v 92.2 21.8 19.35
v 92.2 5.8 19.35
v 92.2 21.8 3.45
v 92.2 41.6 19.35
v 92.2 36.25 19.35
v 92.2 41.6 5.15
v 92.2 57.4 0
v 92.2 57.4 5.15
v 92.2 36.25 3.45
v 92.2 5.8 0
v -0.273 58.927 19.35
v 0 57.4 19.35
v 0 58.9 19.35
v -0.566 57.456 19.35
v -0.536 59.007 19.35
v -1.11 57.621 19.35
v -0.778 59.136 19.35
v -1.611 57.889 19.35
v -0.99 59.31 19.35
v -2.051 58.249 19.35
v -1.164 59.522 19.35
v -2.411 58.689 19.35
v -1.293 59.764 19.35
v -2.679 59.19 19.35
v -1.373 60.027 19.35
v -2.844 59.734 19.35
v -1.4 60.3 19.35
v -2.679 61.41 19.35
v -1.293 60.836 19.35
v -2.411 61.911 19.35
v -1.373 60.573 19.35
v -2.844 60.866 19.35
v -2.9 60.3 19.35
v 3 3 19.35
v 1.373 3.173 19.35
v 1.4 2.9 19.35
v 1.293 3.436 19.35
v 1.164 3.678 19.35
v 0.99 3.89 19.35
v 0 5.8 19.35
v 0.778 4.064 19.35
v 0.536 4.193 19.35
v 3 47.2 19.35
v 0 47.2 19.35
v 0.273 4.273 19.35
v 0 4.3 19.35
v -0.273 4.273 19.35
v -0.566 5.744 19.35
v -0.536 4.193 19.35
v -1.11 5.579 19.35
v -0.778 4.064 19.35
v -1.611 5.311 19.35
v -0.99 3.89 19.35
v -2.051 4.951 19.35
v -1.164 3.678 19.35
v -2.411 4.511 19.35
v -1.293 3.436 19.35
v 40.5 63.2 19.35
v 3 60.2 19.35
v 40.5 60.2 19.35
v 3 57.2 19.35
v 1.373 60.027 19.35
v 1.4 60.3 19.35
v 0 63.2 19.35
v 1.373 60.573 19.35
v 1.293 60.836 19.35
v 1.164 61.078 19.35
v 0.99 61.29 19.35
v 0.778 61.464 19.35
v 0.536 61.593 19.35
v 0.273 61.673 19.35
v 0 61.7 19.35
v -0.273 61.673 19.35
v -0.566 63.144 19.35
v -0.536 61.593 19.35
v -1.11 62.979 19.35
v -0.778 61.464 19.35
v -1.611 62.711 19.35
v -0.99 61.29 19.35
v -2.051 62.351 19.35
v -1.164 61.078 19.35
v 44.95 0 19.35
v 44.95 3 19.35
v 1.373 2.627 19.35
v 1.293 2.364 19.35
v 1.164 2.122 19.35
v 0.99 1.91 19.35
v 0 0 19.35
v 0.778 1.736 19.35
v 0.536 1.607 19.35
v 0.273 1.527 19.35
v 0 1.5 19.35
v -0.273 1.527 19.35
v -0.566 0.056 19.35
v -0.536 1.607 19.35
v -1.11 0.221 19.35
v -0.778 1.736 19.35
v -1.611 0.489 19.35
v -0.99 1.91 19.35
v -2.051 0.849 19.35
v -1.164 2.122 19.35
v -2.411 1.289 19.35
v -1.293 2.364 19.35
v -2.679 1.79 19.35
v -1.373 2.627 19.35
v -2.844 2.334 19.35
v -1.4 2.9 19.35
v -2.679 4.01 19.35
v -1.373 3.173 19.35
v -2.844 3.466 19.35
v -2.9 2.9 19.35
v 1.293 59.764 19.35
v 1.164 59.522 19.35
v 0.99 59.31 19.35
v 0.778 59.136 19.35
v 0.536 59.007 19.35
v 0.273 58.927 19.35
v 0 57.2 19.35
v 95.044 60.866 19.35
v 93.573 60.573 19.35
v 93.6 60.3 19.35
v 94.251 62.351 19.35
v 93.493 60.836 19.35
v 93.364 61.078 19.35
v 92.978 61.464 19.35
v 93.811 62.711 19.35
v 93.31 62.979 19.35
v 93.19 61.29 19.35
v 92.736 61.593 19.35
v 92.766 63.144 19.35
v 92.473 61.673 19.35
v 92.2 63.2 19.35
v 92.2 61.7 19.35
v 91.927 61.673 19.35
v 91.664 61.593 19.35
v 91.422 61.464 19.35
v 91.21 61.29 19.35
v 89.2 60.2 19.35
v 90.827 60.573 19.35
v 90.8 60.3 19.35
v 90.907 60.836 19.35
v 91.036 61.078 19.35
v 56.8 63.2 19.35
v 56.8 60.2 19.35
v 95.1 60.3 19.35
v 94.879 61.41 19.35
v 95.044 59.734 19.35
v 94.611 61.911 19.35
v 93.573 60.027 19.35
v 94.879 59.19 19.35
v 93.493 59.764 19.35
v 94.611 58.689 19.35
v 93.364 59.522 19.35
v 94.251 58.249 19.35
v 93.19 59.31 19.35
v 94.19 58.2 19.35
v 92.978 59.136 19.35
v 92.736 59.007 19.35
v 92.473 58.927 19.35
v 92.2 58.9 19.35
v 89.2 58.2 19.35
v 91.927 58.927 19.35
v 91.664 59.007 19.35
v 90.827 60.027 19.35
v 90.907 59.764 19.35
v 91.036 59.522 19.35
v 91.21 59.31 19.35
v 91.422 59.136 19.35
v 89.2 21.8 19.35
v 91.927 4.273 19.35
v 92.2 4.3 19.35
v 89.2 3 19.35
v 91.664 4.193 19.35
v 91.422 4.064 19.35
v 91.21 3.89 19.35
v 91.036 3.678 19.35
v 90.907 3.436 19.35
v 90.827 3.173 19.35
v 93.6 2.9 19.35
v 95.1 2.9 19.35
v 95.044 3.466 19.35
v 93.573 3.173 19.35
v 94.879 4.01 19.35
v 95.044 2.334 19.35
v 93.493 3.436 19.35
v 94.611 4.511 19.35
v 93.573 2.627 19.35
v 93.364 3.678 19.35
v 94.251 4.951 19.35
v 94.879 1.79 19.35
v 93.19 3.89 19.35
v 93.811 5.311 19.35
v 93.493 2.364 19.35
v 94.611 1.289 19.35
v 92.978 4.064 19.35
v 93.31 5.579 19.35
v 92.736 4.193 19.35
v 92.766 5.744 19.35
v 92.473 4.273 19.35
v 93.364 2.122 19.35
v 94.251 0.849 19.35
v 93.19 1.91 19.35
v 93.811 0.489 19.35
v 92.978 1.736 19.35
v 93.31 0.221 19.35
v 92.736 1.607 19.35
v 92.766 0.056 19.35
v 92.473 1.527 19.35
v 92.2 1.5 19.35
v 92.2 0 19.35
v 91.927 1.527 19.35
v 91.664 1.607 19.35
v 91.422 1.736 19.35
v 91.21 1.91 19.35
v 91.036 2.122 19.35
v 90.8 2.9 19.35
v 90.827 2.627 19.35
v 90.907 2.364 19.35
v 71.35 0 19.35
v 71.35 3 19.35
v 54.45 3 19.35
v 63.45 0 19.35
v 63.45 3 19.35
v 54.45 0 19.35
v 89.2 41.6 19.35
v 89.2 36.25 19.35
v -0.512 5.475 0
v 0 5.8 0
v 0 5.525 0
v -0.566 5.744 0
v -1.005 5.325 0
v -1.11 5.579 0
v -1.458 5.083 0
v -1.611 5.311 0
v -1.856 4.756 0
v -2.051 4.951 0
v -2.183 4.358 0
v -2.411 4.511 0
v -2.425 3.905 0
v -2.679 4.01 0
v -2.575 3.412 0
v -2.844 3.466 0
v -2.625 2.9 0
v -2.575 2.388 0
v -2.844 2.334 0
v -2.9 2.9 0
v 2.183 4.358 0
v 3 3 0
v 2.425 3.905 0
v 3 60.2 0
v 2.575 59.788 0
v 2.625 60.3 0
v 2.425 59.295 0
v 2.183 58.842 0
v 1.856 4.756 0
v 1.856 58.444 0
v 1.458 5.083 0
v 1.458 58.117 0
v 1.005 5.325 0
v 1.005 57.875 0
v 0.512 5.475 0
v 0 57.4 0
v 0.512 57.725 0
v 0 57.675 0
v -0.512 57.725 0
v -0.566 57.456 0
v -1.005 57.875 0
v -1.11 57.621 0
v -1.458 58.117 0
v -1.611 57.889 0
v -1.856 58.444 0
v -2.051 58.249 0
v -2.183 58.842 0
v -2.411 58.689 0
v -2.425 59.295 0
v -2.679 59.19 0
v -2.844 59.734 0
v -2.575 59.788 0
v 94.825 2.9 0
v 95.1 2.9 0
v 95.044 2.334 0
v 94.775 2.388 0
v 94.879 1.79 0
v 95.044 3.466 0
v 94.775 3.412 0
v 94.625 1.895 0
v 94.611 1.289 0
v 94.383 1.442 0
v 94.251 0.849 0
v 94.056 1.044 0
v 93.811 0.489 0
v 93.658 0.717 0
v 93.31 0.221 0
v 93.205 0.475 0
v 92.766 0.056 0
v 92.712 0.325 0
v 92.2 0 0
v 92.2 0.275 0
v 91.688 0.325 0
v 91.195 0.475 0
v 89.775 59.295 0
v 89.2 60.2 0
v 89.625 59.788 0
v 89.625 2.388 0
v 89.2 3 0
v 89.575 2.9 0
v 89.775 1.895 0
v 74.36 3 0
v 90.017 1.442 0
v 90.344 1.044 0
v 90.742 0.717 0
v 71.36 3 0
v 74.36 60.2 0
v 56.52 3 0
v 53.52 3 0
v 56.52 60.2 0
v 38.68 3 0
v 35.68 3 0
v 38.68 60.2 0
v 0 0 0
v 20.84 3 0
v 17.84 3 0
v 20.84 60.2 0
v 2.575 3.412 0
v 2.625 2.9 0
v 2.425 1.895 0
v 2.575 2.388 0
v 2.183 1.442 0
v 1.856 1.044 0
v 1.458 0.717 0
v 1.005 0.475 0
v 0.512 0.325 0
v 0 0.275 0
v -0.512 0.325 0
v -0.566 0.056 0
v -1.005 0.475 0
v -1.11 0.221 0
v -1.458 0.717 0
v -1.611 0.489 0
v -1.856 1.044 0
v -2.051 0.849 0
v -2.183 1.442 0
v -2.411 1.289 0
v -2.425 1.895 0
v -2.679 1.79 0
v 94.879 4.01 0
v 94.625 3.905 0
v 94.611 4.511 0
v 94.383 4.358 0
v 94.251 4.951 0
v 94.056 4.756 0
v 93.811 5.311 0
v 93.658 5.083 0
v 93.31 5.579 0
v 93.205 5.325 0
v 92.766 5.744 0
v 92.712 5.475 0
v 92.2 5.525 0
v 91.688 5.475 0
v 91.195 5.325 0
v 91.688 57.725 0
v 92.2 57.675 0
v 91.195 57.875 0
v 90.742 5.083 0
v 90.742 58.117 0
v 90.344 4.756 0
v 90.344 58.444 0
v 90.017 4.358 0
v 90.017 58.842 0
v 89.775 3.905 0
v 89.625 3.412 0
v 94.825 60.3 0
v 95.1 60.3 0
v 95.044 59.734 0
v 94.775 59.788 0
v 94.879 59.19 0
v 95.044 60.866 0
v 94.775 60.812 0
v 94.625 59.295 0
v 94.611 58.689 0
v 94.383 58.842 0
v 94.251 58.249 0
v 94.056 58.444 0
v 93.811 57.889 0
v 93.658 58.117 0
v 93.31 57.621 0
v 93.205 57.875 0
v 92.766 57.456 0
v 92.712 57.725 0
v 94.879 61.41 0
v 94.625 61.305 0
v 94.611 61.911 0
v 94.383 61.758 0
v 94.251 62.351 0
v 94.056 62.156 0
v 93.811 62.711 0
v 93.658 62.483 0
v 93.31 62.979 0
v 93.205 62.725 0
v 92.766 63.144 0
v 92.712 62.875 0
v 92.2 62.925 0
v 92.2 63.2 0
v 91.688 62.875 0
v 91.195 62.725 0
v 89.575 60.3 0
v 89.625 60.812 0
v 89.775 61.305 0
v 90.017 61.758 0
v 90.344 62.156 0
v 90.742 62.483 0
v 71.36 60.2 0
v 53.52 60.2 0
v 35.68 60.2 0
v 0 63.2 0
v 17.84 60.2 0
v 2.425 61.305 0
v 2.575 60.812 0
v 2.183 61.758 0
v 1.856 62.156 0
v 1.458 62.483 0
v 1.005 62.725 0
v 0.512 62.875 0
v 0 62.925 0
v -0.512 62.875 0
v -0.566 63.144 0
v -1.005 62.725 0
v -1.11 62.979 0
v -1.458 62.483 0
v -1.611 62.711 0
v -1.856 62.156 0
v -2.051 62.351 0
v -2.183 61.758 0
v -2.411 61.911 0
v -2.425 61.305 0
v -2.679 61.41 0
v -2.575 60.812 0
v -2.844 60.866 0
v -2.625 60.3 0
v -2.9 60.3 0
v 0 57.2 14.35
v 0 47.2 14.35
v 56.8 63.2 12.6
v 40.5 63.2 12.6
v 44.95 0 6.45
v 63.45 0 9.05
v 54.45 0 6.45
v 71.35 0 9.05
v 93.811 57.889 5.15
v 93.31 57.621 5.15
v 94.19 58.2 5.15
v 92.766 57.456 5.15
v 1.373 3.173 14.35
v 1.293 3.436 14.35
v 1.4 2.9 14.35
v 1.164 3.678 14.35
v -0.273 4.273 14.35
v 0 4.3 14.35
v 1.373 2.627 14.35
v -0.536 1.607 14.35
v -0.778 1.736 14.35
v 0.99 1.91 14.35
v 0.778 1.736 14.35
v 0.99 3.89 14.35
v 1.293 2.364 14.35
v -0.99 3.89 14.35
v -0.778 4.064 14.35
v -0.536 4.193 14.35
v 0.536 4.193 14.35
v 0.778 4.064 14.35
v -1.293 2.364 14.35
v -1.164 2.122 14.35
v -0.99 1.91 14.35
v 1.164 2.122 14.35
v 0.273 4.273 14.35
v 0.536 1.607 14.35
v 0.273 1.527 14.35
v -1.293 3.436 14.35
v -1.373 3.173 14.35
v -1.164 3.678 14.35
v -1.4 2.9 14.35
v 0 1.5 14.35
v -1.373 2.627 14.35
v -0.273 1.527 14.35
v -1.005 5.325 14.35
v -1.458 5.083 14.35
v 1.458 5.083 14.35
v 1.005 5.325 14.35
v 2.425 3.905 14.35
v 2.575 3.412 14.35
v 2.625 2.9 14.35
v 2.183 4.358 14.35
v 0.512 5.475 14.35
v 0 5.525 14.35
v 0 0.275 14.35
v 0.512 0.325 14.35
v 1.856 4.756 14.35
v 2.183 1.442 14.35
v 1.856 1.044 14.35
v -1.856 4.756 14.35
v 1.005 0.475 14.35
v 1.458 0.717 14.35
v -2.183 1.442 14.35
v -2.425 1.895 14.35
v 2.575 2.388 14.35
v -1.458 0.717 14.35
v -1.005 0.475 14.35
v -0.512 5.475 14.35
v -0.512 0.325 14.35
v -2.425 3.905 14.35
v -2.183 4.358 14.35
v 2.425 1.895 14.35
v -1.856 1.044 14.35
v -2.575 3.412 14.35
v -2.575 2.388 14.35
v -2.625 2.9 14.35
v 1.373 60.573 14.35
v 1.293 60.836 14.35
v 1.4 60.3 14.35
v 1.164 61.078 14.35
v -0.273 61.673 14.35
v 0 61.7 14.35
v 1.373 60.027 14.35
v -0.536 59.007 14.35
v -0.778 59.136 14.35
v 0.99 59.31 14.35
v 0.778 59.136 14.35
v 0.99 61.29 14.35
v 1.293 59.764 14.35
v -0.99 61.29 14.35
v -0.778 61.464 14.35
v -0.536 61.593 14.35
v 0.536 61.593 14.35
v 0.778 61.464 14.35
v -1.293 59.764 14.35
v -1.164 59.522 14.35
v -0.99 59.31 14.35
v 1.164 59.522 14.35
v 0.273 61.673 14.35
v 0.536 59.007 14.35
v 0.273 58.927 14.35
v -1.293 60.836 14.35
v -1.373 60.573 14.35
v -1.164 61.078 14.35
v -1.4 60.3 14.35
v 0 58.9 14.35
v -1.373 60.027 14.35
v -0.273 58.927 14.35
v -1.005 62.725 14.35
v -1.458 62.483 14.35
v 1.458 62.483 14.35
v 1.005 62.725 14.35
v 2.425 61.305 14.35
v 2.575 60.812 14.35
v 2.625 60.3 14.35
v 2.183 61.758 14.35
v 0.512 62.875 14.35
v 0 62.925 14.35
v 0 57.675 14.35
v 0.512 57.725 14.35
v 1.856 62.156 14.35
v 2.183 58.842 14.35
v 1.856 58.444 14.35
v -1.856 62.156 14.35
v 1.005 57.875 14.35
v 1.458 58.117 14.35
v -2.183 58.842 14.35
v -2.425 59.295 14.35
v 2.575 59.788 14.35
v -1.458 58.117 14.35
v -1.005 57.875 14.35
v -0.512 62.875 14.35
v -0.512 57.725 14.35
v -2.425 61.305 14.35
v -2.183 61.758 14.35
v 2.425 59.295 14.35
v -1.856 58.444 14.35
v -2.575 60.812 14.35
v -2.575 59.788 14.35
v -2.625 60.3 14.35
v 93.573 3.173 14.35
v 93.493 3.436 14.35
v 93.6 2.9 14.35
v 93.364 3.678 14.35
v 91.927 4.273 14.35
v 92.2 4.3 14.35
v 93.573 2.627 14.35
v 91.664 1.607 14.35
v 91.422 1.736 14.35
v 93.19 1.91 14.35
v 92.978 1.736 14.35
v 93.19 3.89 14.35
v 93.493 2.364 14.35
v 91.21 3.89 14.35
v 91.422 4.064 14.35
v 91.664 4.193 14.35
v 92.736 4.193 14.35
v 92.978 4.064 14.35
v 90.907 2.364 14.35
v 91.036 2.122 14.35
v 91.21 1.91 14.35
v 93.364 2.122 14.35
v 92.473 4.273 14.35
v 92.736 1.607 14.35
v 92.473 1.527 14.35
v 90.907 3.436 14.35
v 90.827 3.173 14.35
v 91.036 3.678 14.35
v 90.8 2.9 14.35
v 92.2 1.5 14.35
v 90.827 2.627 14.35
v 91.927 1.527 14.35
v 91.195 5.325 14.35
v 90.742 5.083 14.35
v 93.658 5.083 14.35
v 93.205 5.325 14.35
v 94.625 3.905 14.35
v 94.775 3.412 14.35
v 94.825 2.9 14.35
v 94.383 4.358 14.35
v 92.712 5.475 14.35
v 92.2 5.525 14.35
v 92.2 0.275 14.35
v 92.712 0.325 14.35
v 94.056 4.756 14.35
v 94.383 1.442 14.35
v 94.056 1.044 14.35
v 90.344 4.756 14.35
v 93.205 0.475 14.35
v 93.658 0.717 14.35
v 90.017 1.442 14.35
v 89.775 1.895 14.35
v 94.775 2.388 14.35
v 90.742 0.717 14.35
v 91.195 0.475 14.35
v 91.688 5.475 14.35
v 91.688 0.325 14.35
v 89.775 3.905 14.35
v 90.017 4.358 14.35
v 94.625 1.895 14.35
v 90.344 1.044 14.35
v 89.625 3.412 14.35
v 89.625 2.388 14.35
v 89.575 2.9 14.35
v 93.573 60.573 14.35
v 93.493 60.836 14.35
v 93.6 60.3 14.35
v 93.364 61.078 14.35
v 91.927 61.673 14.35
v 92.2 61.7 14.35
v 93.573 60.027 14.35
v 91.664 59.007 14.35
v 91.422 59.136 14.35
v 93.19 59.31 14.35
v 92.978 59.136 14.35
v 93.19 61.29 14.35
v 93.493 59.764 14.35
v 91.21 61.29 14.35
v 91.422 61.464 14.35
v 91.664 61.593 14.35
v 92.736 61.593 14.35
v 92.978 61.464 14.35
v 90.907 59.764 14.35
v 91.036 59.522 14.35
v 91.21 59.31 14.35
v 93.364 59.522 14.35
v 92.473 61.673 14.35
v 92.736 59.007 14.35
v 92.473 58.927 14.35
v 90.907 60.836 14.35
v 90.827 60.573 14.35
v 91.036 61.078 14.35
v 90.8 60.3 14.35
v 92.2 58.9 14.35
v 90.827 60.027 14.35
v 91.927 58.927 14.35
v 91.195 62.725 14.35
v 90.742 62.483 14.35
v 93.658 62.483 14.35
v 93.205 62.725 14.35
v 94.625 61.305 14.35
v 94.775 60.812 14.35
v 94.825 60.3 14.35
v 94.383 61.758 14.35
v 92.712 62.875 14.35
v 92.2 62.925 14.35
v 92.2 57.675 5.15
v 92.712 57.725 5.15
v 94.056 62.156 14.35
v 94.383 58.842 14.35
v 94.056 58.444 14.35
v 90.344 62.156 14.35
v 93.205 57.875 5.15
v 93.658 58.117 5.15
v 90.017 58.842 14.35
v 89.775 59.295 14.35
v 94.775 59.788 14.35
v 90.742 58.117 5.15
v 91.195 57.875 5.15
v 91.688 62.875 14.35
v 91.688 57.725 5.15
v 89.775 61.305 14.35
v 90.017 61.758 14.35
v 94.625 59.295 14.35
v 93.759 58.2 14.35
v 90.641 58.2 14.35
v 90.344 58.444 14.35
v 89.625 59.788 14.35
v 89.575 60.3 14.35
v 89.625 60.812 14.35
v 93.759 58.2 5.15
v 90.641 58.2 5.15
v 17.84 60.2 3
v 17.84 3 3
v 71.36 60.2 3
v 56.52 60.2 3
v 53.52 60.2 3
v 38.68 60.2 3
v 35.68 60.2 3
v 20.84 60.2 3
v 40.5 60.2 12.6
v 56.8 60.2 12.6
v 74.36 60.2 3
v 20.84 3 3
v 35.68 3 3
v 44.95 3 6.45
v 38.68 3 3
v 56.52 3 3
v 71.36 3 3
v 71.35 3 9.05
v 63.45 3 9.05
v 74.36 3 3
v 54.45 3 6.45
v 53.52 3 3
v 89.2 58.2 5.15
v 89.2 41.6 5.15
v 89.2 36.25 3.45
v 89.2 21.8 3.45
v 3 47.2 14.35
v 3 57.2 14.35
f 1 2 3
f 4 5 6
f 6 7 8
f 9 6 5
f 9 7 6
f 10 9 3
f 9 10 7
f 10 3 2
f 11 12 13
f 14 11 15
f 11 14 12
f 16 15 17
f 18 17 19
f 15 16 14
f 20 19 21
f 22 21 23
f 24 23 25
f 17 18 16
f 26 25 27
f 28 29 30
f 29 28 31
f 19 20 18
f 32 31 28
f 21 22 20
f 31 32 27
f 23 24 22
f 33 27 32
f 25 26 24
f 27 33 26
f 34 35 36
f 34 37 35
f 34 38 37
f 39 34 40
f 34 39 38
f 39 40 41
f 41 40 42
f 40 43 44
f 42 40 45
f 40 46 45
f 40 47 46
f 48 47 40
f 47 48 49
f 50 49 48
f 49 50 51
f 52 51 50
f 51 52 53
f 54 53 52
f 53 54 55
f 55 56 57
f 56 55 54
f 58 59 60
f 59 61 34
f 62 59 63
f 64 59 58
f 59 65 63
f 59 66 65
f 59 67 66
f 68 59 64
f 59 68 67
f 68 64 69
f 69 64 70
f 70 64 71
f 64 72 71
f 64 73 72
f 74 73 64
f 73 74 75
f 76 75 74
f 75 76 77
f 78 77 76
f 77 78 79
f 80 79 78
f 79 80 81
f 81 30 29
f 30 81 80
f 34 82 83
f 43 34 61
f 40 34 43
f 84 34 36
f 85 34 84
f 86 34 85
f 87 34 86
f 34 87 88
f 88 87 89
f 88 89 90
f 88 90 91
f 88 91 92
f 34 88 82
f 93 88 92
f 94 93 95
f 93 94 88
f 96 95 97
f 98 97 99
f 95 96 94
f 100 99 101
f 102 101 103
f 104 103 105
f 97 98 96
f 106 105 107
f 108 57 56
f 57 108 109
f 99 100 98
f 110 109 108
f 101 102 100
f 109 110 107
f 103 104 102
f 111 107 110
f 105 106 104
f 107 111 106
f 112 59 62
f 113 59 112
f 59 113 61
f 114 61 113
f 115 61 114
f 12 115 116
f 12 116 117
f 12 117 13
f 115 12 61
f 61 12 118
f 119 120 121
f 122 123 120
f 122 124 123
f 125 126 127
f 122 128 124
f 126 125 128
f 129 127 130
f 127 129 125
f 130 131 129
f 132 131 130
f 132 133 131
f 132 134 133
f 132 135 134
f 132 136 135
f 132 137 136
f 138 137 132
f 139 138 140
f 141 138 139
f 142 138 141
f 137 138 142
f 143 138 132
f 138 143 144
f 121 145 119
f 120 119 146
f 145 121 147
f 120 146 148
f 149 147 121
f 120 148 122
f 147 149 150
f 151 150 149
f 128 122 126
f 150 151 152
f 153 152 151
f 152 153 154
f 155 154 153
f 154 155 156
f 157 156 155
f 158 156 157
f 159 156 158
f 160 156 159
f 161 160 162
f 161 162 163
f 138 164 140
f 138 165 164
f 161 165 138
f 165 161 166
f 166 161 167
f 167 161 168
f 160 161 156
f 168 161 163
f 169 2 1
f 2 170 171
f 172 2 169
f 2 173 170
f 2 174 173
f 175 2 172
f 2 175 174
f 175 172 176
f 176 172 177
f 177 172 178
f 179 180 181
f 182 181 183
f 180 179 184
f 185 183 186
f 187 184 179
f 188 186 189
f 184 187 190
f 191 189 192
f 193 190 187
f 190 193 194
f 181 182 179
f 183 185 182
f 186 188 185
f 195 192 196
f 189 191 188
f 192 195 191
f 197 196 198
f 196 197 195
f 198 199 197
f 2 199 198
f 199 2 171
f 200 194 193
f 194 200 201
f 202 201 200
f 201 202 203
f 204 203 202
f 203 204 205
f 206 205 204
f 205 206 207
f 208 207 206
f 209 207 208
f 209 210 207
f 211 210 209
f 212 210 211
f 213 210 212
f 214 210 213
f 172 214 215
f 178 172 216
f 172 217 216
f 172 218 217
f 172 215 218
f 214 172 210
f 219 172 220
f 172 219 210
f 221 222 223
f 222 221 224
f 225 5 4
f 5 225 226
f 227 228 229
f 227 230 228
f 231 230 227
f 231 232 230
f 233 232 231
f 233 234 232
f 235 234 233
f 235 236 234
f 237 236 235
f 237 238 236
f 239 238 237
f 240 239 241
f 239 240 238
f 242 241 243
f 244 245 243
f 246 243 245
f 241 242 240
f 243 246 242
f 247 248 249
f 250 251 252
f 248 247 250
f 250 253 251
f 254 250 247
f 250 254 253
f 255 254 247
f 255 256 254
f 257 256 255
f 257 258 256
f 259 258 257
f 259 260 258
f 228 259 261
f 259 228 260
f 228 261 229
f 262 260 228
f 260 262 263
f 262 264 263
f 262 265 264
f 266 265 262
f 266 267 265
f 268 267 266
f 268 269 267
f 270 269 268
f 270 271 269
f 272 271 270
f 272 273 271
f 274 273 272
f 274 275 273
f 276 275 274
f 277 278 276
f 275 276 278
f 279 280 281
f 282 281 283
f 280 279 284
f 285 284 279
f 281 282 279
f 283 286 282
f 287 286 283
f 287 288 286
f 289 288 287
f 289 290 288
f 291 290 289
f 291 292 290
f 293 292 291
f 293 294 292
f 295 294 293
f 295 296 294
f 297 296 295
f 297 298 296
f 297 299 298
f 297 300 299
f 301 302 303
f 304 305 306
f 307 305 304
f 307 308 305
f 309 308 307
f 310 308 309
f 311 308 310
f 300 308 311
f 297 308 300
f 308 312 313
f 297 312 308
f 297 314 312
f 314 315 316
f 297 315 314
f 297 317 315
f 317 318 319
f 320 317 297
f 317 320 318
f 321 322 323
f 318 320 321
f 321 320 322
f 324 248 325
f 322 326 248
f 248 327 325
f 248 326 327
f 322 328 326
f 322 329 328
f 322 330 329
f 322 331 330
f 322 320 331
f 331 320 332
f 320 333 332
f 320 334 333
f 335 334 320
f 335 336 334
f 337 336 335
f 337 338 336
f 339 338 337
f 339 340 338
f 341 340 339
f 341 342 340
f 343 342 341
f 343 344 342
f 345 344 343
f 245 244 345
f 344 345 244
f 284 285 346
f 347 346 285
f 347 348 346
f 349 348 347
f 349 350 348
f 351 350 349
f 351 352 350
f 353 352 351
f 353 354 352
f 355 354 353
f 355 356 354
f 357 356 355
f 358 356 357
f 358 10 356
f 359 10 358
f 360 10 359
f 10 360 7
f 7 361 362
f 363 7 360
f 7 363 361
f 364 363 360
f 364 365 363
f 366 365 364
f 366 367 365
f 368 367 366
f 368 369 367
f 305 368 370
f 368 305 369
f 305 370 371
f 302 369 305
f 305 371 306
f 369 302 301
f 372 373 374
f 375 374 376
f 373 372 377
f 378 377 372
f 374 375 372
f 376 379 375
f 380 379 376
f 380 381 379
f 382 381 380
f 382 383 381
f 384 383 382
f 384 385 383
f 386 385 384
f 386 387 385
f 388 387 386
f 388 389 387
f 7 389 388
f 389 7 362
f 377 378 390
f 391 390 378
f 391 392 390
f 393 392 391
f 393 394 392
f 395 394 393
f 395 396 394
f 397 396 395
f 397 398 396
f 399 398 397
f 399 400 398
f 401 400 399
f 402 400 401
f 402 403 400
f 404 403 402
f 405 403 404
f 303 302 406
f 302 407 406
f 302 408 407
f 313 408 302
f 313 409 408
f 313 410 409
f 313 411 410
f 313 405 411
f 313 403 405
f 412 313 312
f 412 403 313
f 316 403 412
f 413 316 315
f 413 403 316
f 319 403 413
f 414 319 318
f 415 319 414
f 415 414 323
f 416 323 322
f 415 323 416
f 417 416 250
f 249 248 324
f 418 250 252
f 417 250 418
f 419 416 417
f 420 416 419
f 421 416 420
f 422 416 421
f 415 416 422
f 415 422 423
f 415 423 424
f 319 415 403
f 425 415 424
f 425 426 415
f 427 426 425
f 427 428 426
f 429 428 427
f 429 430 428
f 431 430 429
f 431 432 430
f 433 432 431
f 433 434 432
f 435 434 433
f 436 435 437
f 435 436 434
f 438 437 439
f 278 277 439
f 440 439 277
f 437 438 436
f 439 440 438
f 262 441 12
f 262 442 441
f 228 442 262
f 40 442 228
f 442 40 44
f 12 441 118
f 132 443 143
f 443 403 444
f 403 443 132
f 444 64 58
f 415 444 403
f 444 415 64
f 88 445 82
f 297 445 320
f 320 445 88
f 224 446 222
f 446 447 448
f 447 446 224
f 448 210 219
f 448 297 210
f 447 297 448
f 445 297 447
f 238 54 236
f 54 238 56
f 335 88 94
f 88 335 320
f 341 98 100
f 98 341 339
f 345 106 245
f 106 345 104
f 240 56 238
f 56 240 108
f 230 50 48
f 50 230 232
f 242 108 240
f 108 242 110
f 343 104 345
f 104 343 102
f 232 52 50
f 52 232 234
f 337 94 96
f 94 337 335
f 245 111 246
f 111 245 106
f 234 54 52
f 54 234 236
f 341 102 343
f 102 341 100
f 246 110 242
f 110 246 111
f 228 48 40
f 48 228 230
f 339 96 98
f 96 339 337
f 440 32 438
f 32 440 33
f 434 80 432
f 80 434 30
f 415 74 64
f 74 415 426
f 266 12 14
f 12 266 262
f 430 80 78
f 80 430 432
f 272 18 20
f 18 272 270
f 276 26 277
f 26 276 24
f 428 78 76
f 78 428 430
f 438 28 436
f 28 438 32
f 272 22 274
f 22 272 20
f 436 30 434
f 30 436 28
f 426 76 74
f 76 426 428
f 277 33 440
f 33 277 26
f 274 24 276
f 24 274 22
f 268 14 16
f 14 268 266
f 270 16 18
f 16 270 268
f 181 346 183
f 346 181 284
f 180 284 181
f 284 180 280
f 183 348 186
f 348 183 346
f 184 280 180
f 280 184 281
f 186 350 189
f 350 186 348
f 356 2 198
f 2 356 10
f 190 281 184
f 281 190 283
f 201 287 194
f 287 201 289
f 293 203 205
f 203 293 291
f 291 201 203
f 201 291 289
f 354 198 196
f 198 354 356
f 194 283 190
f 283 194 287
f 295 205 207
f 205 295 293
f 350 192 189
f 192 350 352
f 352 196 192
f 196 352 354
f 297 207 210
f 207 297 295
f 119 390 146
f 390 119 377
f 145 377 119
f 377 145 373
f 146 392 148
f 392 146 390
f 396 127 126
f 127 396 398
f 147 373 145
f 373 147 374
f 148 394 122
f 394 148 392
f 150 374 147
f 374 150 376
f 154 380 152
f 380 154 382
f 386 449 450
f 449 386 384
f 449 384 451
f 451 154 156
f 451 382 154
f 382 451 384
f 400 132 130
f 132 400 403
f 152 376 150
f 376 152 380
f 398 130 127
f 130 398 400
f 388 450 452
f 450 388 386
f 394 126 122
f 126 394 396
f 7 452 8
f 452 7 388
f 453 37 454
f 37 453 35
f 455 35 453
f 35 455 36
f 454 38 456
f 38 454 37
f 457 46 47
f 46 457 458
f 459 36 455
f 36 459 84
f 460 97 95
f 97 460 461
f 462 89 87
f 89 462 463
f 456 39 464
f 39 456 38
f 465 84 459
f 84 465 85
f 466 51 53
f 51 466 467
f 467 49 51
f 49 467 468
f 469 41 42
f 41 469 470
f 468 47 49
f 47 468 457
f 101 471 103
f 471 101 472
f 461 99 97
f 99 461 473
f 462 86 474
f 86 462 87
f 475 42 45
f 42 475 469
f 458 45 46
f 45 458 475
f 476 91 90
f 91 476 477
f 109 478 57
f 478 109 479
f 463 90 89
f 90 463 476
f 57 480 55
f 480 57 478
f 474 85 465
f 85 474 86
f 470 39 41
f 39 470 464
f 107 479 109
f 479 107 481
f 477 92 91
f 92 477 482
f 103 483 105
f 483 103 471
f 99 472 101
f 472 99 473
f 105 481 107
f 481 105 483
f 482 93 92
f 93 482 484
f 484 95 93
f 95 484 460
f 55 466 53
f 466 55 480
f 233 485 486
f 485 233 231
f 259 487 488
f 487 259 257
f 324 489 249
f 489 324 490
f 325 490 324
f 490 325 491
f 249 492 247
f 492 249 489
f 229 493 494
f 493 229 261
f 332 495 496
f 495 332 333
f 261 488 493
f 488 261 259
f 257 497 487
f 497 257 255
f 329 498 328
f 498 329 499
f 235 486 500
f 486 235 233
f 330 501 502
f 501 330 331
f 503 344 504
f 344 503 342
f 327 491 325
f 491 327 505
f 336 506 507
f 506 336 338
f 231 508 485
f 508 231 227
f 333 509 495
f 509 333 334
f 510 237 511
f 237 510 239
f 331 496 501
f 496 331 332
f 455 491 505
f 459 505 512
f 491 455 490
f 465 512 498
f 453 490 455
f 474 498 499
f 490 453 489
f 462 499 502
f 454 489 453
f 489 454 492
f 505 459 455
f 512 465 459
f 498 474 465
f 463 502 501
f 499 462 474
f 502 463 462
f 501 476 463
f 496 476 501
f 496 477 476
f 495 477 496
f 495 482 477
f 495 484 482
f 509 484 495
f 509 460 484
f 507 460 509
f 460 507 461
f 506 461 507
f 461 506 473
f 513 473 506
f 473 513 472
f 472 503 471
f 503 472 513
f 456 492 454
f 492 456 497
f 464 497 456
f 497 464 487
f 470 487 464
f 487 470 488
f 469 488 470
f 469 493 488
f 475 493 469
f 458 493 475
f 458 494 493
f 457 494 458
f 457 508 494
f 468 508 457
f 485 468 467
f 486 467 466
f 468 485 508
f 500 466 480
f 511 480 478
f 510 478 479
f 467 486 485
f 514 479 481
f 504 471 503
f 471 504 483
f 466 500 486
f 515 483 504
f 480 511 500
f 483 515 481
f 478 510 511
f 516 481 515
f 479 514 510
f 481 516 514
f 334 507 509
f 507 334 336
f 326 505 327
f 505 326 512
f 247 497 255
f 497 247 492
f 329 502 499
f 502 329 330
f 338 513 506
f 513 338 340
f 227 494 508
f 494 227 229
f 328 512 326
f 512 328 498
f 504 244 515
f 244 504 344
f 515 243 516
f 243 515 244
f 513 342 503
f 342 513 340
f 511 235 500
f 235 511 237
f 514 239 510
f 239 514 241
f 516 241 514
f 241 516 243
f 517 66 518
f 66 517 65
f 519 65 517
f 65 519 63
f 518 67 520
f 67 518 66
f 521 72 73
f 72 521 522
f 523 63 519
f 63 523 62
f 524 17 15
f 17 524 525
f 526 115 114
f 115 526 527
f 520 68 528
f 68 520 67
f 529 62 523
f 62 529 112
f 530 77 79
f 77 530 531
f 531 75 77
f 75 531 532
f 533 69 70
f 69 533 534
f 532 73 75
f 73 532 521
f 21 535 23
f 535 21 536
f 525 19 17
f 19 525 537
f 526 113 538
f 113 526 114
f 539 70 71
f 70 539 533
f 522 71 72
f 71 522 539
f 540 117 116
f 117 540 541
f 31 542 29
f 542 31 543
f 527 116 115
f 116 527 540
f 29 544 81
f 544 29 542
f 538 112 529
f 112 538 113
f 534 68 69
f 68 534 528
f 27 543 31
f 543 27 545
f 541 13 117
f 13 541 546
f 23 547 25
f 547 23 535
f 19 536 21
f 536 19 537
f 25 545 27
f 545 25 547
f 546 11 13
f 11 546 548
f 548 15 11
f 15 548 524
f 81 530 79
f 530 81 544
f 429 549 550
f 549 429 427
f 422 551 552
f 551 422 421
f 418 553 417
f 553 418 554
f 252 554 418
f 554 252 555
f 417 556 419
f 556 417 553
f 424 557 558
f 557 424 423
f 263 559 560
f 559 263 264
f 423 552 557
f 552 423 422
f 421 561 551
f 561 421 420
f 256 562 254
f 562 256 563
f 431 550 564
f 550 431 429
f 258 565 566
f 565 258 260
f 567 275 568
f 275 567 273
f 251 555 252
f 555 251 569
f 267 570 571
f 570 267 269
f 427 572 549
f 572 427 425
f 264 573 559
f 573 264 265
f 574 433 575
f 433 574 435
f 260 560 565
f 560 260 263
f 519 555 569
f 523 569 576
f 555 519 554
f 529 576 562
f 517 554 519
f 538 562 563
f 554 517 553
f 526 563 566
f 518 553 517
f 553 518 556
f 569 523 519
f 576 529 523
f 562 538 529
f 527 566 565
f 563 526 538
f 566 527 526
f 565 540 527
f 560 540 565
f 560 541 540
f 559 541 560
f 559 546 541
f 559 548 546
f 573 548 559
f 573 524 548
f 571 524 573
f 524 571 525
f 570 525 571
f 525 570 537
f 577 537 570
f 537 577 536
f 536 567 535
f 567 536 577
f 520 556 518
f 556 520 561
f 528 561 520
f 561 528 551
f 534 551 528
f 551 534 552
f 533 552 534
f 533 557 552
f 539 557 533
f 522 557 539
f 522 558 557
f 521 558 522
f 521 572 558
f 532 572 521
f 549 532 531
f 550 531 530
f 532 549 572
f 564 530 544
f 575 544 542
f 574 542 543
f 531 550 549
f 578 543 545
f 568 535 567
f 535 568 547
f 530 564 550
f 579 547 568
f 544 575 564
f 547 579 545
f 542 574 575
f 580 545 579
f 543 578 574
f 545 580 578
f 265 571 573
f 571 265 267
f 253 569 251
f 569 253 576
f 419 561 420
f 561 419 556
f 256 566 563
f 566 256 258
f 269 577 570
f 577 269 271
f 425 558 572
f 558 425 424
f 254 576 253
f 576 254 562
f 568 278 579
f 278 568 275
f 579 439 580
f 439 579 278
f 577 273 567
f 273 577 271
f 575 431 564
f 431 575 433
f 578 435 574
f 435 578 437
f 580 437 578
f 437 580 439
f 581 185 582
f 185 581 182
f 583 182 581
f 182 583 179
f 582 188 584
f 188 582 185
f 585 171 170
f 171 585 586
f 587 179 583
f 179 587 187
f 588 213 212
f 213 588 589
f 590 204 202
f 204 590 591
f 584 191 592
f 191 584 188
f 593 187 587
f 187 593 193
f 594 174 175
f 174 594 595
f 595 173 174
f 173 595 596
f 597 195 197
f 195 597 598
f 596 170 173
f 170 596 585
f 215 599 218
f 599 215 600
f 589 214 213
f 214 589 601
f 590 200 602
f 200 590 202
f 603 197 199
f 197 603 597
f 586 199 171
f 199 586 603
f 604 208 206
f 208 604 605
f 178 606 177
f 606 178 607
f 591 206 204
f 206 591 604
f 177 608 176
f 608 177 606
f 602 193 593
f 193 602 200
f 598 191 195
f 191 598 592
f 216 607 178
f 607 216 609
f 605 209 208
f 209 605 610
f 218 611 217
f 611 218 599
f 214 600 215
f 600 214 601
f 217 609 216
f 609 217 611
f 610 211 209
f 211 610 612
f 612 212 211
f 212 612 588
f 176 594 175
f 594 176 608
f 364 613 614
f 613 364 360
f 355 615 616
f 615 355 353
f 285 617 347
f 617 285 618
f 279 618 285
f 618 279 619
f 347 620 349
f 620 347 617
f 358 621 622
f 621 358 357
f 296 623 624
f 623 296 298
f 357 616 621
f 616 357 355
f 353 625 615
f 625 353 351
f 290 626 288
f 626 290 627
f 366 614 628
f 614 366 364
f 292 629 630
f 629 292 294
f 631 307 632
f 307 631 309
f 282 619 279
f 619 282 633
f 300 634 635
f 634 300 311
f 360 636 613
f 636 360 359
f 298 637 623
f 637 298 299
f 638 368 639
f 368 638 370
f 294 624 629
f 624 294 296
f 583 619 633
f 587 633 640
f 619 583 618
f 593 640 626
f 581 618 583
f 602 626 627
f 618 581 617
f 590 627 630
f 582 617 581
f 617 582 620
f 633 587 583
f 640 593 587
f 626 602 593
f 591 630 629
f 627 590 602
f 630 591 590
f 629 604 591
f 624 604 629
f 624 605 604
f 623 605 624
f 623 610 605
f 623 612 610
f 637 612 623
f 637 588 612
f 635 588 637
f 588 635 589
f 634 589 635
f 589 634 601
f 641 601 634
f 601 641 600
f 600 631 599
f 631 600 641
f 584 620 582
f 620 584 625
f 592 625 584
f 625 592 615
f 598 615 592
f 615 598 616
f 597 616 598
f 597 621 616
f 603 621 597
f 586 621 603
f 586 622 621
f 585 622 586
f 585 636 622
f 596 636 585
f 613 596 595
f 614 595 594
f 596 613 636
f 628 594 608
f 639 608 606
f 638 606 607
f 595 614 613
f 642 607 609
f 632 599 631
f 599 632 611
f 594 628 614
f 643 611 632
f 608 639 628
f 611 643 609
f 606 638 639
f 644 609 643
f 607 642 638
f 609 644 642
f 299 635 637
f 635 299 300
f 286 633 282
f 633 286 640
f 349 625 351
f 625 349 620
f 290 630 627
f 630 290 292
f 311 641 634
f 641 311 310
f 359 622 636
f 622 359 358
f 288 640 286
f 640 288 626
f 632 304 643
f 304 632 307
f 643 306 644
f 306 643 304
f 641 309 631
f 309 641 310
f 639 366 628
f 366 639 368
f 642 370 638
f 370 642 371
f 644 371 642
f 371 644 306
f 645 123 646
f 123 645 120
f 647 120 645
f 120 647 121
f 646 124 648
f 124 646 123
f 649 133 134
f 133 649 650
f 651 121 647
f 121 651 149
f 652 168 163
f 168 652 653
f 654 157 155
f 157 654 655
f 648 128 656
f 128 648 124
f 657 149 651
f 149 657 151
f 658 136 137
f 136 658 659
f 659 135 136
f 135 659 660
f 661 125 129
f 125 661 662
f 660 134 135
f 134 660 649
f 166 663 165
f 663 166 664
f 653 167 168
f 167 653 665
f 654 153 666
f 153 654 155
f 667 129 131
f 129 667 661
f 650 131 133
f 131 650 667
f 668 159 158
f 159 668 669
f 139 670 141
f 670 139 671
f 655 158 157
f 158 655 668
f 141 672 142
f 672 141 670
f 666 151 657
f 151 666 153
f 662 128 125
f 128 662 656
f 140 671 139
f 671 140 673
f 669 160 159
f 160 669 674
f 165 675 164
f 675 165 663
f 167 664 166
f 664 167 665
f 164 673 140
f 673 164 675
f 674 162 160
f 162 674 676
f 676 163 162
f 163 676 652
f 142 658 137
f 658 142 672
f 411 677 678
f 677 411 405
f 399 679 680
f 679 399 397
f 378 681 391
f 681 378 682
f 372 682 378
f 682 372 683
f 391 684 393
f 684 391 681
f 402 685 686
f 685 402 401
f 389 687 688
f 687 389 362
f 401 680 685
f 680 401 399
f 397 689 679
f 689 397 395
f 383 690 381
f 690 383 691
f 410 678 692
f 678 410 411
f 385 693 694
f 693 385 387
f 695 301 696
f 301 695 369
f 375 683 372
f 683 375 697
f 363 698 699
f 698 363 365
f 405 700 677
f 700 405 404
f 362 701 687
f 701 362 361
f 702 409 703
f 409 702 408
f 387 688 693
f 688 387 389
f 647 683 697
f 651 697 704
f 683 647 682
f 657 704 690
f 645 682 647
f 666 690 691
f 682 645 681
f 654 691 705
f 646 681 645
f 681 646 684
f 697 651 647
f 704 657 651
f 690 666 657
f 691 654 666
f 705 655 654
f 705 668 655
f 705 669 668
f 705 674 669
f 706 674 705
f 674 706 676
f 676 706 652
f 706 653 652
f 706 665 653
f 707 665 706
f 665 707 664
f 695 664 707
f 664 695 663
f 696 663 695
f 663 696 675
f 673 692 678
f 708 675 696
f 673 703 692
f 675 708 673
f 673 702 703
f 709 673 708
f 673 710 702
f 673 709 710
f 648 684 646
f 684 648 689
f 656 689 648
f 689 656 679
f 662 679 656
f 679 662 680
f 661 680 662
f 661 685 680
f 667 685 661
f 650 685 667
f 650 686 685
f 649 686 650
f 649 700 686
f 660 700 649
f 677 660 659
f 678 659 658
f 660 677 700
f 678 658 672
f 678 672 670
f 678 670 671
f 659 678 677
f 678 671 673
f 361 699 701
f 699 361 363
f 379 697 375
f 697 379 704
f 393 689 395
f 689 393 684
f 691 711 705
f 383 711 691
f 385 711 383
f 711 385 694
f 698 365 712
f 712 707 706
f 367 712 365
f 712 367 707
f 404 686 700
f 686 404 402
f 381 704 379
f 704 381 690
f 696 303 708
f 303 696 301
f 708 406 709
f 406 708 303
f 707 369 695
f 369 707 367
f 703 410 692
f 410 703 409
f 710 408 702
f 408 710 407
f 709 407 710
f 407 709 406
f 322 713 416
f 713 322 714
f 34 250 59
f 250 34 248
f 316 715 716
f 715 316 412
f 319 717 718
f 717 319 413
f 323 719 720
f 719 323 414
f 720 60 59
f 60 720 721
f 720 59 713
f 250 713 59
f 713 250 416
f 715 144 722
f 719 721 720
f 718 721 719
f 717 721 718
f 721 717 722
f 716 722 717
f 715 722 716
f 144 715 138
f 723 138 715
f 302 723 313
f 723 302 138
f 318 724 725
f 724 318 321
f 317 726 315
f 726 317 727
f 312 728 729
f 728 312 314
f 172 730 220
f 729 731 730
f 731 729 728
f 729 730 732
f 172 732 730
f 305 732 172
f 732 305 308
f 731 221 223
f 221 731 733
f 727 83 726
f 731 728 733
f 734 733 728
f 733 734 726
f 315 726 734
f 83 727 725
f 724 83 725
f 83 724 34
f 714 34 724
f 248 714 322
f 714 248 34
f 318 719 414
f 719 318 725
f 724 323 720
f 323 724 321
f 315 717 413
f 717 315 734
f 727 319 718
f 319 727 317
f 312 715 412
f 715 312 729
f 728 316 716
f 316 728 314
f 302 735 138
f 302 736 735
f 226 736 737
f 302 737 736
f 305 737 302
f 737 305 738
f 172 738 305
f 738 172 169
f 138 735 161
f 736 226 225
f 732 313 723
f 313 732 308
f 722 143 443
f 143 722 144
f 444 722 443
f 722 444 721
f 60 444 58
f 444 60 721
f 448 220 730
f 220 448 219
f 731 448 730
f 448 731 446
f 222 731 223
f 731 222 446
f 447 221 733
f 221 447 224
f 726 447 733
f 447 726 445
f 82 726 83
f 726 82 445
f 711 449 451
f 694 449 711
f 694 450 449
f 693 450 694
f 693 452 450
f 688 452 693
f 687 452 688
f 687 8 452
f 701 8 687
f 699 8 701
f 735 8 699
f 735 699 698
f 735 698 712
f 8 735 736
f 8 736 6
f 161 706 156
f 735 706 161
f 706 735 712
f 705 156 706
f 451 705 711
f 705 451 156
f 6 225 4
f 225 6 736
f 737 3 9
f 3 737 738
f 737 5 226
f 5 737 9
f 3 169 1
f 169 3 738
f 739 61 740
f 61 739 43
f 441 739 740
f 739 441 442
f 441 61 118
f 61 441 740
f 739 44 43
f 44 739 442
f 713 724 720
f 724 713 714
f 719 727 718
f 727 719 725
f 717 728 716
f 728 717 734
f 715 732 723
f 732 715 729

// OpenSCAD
$fn = 32;

tolerance = 0.6;
thickness = 3;

width = 85;
height = 56;
bottom_spacing = 3;
hole_d = 2.75;
outer_hole_d = 6.2;
board_thickness = 1.3;
components_height = 15.75;
bolt_hole = 2.5;

bolt_head = 5.25;
bolt_hole_d = 2.8;
bolt_depth = 10;

board_mount_positions = [
// Raspberry PI A, B rev2
    [tolerance + 25.5, tolerance + 18, 0],
    [2 * tolerance + width - 5, 2 * tolerance + height - 12.5, 0]

// Raspberry PI B+ and newer
//    [tolerance + 3.5, tolerance + 3.5, 0],
//    [tolerance + 3.5 + 58, tolerance + 3.5, 0],
//    [tolerance + 3.5, 2 * tolerance + height - 3.5, 0],
//    [tolerance + 3.5 + 58, 2 * tolerance + height - 3.5, 0]
];

//bottom_part();
//translate([0, -height -thickness * 2 - 10, 0])
    top_part();

module top_part() {
    outer_dimensions = [
        width + thickness * 2 + tolerance * 2,
        height + thickness * 2 + tolerance * 2,
        components_height + tolerance + thickness
    ];
    inner_dimensions = [
        width + tolerance * 2,
        height + tolerance * 2,
        components_height + tolerance
    ];

    difference() {
        union() {
            cube(outer_dimensions);
            translate([0, (bolt_hole_d + thickness) / 2, 0]) {
                _bottom_part__bolt_outer_shell(h = outer_dimensions[2]);
            }
            translate([0, outer_dimensions[1] - (bolt_hole_d + thickness) / 2, 0]) {
                _bottom_part__bolt_outer_shell(h = outer_dimensions[2]);
            }
            translate([outer_dimensions[0], (bolt_hole_d + thickness) / 2, 0]) {
                _bottom_part__bolt_outer_shell(h = outer_dimensions[2]);
            }
            translate([outer_dimensions[0], outer_dimensions[1] - (bolt_hole_d + thickness) / 2, 0]) {
                _bottom_part__bolt_outer_shell(h = outer_dimensions[2]);
            }
        }

        translate([thickness, thickness, thickness]) {
            cube(inner_dimensions);
        }
        translate([0, (bolt_hole_d + thickness) / 2, 0]) {
            _top_part__bolt_inner_hole(h = outer_dimensions[2]);
        }
        translate([0, outer_dimensions[1] - (bolt_hole_d + thickness) / 2, 0]) {
            _top_part__bolt_inner_hole(h = outer_dimensions[2]);
        }
        translate([outer_dimensions[0], (bolt_hole_d + thickness) / 2, 0]) {
            _top_part__bolt_inner_hole(h = outer_dimensions[2]);
        }
        translate([outer_dimensions[0], outer_dimensions[1] - (bolt_hole_d + thickness) / 2, 0]) {
            _top_part__bolt_inner_hole(h = outer_dimensions[2]);
        }

        lid_filament_saving(inner_dimensions = inner_dimensions);

        _top_part__a_b_rev2_holes(outer_dimensions = outer_dimensions);
    }
}

module bottom_part() {
    outer_dimensions = [
        width + thickness * 2 + tolerance * 2,
        height + thickness * 2 + tolerance * 2,
        thickness + bottom_spacing + tolerance + board_thickness + tolerance
    ];
    inner_dimensions = [
        width + tolerance * 2,
        height + tolerance * 2,
        bottom_spacing + tolerance + board_thickness + tolerance
    ];

    translate([thickness, thickness, thickness]) {
        for (i = board_mount_positions) {
            translate(i) _bottom_part__board_mount();
            translate([i[0] - outer_hole_d / 2, 0, -thickness])
                cube([outer_hole_d, inner_dimensions[1], thickness]);
        }
    }

    difference() {
        union() {
            cube(outer_dimensions);
            translate([0, (bolt_hole_d + thickness) / 2, 0]) {
                _bottom_part__bolt_outer_shell(h = outer_dimensions[2]);
            }
            translate([0, outer_dimensions[1] - (bolt_hole_d + thickness) / 2, 0]) {
                _bottom_part__bolt_outer_shell(h = outer_dimensions[2]);
            }
            translate([outer_dimensions[0], (bolt_hole_d + thickness) / 2, 0]) {
                _bottom_part__bolt_outer_shell(h = outer_dimensions[2]);
            }
            translate([outer_dimensions[0], outer_dimensions[1] - (bolt_hole_d + thickness) / 2, 0]) {
                _bottom_part__bolt_outer_shell(h = outer_dimensions[2]);
            }
        }

        translate([thickness, thickness, thickness]) {
            cube(inner_dimensions);
        }
        translate([0, (bolt_hole_d + thickness) / 2, 0]) {
            _bottom_part__bolt_inner_hole(h = outer_dimensions[2]);
        }
        translate([0, outer_dimensions[1] - (bolt_hole_d + thickness) / 2, 0]) {
            _bottom_part__bolt_inner_hole(h = outer_dimensions[2]);
        }
        translate([outer_dimensions[0], (bolt_hole_d + thickness) / 2, 0]) {
            _bottom_part__bolt_inner_hole(h = outer_dimensions[2]);
        }
        translate([outer_dimensions[0], outer_dimensions[1] - (bolt_hole_d + thickness) / 2, 0]) {
            _bottom_part__bolt_inner_hole(h = outer_dimensions[2]);
        }

        lid_filament_saving(inner_dimensions = inner_dimensions);

        _bottom_part__a_b_rev2_holes(outer_dimensions = outer_dimensions);
    }
}

module _top_part__a_b_rev2_holes(outer_dimensions) {
    // hdmi
    hdmi_dimensions = [15.1 + 2 * tolerance, thickness, 6.15 + tolerance];
    translate([
        thickness + 37.5,
        outer_dimensions[1] - hdmi_dimensions[1],
        outer_dimensions[2] - hdmi_dimensions[2]
    ]) {
        cube(hdmi_dimensions);
    }

    // jack
    jack_dimensions = [6.7 + tolerance * 2, thickness, 3 + 6.7 + tolerance];
    translate([
        outer_dimensions[0] - thickness - tolerance * 2 - jack_dimensions[0] - 14 - 2.65,
        0,
        outer_dimensions[2] - jack_dimensions[2]
    ]) {
        cube(jack_dimensions);
    }

    // composite
    composite_dimensions = [8.3 + tolerance * 2, thickness, 4 + 8.3 + tolerance];
    translate([
        thickness + tolerance + 40.6 + 0.75,
        0,
        outer_dimensions[2] - composite_dimensions[2]
    ])
    cube(composite_dimensions);

    // ethernet
    ethernet_dimensions = [thickness + bolt_hole_d + thickness, 15.4 + tolerance * 2, 13 + tolerance * 2];
    translate([
        outer_dimensions[0] - thickness,
        outer_dimensions[1] - ethernet_dimensions[1] - thickness - 2,
        outer_dimensions[2] - ethernet_dimensions[2]
    ]) {
        cube(ethernet_dimensions);
    }

    // usb
    usb_dimensions = [thickness , 13.25 + tolerance * 2, 15.3 + tolerance];
    translate([
        outer_dimensions[0] - usb_dimensions[0],
        thickness + 18.8,
        outer_dimensions[2] - usb_dimensions[2]
    ]) {
        cube(usb_dimensions);
    }

    // micro usb
    translate([-outer_hole_d, outer_dimensions[1] - 2.4 - thickness - tolerance - 10, outer_dimensions[2] - 5]) {
        cube([thickness + outer_hole_d, 10, 7]);
    }
}

module _top_part__bolt_inner_hole(h) {
    _bottom_part__bolt_inner_hole(h = h);
    cylinder(d = bolt_head, h = h - bolt_depth / 2);
}

module _bottom_part__a_b_rev2_holes(outer_dimensions) {
    // mem card
    translate([
            0,
            outer_dimensions[1] - thickness - tolerance - 27.8 - tolerance - 11.5,
            outer_dimensions[2] - 5 + tolerance * 2
        ]) {
            cube([thickness, 27.8 + tolerance * 2, 5 + tolerance * 2]);
        }

    // micro usb
    translate([-outer_hole_d, 2.4 + thickness + tolerance, thickness + bottom_spacing - 1]) {
        cube([thickness + outer_hole_d, 10, 7]);
    }
}

module _bottom_part__board_mount() {
    cylinder(d = outer_hole_d - tolerance * 2, h = bottom_spacing);
    translate([0, 0, bottom_spacing])
        cylinder(d = hole_d - tolerance * 2, h = board_thickness);
}

module _bottom_part__bolt_outer_shell(h) {
    cylinder(h = h, d = bolt_hole_d + thickness);
}

module _bottom_part__bolt_inner_hole(h) {
    cylinder(h = h, d = bolt_hole_d);
}

module lid_filament_saving(inner_dimensions) {
    spaces = 5;
    space_x = (inner_dimensions[0] - (thickness * (spaces - 1))) / spaces;
    translate([thickness, thickness, 0]) {
        for (i = [0:spaces - 1]) {
            translate([thickness * i + space_x * i, 0, 0]) {
                cube([
                    space_x,
                    inner_dimensions[1],
                    inner_dimensions[2]
                ]);
            }
        }
    }
}
